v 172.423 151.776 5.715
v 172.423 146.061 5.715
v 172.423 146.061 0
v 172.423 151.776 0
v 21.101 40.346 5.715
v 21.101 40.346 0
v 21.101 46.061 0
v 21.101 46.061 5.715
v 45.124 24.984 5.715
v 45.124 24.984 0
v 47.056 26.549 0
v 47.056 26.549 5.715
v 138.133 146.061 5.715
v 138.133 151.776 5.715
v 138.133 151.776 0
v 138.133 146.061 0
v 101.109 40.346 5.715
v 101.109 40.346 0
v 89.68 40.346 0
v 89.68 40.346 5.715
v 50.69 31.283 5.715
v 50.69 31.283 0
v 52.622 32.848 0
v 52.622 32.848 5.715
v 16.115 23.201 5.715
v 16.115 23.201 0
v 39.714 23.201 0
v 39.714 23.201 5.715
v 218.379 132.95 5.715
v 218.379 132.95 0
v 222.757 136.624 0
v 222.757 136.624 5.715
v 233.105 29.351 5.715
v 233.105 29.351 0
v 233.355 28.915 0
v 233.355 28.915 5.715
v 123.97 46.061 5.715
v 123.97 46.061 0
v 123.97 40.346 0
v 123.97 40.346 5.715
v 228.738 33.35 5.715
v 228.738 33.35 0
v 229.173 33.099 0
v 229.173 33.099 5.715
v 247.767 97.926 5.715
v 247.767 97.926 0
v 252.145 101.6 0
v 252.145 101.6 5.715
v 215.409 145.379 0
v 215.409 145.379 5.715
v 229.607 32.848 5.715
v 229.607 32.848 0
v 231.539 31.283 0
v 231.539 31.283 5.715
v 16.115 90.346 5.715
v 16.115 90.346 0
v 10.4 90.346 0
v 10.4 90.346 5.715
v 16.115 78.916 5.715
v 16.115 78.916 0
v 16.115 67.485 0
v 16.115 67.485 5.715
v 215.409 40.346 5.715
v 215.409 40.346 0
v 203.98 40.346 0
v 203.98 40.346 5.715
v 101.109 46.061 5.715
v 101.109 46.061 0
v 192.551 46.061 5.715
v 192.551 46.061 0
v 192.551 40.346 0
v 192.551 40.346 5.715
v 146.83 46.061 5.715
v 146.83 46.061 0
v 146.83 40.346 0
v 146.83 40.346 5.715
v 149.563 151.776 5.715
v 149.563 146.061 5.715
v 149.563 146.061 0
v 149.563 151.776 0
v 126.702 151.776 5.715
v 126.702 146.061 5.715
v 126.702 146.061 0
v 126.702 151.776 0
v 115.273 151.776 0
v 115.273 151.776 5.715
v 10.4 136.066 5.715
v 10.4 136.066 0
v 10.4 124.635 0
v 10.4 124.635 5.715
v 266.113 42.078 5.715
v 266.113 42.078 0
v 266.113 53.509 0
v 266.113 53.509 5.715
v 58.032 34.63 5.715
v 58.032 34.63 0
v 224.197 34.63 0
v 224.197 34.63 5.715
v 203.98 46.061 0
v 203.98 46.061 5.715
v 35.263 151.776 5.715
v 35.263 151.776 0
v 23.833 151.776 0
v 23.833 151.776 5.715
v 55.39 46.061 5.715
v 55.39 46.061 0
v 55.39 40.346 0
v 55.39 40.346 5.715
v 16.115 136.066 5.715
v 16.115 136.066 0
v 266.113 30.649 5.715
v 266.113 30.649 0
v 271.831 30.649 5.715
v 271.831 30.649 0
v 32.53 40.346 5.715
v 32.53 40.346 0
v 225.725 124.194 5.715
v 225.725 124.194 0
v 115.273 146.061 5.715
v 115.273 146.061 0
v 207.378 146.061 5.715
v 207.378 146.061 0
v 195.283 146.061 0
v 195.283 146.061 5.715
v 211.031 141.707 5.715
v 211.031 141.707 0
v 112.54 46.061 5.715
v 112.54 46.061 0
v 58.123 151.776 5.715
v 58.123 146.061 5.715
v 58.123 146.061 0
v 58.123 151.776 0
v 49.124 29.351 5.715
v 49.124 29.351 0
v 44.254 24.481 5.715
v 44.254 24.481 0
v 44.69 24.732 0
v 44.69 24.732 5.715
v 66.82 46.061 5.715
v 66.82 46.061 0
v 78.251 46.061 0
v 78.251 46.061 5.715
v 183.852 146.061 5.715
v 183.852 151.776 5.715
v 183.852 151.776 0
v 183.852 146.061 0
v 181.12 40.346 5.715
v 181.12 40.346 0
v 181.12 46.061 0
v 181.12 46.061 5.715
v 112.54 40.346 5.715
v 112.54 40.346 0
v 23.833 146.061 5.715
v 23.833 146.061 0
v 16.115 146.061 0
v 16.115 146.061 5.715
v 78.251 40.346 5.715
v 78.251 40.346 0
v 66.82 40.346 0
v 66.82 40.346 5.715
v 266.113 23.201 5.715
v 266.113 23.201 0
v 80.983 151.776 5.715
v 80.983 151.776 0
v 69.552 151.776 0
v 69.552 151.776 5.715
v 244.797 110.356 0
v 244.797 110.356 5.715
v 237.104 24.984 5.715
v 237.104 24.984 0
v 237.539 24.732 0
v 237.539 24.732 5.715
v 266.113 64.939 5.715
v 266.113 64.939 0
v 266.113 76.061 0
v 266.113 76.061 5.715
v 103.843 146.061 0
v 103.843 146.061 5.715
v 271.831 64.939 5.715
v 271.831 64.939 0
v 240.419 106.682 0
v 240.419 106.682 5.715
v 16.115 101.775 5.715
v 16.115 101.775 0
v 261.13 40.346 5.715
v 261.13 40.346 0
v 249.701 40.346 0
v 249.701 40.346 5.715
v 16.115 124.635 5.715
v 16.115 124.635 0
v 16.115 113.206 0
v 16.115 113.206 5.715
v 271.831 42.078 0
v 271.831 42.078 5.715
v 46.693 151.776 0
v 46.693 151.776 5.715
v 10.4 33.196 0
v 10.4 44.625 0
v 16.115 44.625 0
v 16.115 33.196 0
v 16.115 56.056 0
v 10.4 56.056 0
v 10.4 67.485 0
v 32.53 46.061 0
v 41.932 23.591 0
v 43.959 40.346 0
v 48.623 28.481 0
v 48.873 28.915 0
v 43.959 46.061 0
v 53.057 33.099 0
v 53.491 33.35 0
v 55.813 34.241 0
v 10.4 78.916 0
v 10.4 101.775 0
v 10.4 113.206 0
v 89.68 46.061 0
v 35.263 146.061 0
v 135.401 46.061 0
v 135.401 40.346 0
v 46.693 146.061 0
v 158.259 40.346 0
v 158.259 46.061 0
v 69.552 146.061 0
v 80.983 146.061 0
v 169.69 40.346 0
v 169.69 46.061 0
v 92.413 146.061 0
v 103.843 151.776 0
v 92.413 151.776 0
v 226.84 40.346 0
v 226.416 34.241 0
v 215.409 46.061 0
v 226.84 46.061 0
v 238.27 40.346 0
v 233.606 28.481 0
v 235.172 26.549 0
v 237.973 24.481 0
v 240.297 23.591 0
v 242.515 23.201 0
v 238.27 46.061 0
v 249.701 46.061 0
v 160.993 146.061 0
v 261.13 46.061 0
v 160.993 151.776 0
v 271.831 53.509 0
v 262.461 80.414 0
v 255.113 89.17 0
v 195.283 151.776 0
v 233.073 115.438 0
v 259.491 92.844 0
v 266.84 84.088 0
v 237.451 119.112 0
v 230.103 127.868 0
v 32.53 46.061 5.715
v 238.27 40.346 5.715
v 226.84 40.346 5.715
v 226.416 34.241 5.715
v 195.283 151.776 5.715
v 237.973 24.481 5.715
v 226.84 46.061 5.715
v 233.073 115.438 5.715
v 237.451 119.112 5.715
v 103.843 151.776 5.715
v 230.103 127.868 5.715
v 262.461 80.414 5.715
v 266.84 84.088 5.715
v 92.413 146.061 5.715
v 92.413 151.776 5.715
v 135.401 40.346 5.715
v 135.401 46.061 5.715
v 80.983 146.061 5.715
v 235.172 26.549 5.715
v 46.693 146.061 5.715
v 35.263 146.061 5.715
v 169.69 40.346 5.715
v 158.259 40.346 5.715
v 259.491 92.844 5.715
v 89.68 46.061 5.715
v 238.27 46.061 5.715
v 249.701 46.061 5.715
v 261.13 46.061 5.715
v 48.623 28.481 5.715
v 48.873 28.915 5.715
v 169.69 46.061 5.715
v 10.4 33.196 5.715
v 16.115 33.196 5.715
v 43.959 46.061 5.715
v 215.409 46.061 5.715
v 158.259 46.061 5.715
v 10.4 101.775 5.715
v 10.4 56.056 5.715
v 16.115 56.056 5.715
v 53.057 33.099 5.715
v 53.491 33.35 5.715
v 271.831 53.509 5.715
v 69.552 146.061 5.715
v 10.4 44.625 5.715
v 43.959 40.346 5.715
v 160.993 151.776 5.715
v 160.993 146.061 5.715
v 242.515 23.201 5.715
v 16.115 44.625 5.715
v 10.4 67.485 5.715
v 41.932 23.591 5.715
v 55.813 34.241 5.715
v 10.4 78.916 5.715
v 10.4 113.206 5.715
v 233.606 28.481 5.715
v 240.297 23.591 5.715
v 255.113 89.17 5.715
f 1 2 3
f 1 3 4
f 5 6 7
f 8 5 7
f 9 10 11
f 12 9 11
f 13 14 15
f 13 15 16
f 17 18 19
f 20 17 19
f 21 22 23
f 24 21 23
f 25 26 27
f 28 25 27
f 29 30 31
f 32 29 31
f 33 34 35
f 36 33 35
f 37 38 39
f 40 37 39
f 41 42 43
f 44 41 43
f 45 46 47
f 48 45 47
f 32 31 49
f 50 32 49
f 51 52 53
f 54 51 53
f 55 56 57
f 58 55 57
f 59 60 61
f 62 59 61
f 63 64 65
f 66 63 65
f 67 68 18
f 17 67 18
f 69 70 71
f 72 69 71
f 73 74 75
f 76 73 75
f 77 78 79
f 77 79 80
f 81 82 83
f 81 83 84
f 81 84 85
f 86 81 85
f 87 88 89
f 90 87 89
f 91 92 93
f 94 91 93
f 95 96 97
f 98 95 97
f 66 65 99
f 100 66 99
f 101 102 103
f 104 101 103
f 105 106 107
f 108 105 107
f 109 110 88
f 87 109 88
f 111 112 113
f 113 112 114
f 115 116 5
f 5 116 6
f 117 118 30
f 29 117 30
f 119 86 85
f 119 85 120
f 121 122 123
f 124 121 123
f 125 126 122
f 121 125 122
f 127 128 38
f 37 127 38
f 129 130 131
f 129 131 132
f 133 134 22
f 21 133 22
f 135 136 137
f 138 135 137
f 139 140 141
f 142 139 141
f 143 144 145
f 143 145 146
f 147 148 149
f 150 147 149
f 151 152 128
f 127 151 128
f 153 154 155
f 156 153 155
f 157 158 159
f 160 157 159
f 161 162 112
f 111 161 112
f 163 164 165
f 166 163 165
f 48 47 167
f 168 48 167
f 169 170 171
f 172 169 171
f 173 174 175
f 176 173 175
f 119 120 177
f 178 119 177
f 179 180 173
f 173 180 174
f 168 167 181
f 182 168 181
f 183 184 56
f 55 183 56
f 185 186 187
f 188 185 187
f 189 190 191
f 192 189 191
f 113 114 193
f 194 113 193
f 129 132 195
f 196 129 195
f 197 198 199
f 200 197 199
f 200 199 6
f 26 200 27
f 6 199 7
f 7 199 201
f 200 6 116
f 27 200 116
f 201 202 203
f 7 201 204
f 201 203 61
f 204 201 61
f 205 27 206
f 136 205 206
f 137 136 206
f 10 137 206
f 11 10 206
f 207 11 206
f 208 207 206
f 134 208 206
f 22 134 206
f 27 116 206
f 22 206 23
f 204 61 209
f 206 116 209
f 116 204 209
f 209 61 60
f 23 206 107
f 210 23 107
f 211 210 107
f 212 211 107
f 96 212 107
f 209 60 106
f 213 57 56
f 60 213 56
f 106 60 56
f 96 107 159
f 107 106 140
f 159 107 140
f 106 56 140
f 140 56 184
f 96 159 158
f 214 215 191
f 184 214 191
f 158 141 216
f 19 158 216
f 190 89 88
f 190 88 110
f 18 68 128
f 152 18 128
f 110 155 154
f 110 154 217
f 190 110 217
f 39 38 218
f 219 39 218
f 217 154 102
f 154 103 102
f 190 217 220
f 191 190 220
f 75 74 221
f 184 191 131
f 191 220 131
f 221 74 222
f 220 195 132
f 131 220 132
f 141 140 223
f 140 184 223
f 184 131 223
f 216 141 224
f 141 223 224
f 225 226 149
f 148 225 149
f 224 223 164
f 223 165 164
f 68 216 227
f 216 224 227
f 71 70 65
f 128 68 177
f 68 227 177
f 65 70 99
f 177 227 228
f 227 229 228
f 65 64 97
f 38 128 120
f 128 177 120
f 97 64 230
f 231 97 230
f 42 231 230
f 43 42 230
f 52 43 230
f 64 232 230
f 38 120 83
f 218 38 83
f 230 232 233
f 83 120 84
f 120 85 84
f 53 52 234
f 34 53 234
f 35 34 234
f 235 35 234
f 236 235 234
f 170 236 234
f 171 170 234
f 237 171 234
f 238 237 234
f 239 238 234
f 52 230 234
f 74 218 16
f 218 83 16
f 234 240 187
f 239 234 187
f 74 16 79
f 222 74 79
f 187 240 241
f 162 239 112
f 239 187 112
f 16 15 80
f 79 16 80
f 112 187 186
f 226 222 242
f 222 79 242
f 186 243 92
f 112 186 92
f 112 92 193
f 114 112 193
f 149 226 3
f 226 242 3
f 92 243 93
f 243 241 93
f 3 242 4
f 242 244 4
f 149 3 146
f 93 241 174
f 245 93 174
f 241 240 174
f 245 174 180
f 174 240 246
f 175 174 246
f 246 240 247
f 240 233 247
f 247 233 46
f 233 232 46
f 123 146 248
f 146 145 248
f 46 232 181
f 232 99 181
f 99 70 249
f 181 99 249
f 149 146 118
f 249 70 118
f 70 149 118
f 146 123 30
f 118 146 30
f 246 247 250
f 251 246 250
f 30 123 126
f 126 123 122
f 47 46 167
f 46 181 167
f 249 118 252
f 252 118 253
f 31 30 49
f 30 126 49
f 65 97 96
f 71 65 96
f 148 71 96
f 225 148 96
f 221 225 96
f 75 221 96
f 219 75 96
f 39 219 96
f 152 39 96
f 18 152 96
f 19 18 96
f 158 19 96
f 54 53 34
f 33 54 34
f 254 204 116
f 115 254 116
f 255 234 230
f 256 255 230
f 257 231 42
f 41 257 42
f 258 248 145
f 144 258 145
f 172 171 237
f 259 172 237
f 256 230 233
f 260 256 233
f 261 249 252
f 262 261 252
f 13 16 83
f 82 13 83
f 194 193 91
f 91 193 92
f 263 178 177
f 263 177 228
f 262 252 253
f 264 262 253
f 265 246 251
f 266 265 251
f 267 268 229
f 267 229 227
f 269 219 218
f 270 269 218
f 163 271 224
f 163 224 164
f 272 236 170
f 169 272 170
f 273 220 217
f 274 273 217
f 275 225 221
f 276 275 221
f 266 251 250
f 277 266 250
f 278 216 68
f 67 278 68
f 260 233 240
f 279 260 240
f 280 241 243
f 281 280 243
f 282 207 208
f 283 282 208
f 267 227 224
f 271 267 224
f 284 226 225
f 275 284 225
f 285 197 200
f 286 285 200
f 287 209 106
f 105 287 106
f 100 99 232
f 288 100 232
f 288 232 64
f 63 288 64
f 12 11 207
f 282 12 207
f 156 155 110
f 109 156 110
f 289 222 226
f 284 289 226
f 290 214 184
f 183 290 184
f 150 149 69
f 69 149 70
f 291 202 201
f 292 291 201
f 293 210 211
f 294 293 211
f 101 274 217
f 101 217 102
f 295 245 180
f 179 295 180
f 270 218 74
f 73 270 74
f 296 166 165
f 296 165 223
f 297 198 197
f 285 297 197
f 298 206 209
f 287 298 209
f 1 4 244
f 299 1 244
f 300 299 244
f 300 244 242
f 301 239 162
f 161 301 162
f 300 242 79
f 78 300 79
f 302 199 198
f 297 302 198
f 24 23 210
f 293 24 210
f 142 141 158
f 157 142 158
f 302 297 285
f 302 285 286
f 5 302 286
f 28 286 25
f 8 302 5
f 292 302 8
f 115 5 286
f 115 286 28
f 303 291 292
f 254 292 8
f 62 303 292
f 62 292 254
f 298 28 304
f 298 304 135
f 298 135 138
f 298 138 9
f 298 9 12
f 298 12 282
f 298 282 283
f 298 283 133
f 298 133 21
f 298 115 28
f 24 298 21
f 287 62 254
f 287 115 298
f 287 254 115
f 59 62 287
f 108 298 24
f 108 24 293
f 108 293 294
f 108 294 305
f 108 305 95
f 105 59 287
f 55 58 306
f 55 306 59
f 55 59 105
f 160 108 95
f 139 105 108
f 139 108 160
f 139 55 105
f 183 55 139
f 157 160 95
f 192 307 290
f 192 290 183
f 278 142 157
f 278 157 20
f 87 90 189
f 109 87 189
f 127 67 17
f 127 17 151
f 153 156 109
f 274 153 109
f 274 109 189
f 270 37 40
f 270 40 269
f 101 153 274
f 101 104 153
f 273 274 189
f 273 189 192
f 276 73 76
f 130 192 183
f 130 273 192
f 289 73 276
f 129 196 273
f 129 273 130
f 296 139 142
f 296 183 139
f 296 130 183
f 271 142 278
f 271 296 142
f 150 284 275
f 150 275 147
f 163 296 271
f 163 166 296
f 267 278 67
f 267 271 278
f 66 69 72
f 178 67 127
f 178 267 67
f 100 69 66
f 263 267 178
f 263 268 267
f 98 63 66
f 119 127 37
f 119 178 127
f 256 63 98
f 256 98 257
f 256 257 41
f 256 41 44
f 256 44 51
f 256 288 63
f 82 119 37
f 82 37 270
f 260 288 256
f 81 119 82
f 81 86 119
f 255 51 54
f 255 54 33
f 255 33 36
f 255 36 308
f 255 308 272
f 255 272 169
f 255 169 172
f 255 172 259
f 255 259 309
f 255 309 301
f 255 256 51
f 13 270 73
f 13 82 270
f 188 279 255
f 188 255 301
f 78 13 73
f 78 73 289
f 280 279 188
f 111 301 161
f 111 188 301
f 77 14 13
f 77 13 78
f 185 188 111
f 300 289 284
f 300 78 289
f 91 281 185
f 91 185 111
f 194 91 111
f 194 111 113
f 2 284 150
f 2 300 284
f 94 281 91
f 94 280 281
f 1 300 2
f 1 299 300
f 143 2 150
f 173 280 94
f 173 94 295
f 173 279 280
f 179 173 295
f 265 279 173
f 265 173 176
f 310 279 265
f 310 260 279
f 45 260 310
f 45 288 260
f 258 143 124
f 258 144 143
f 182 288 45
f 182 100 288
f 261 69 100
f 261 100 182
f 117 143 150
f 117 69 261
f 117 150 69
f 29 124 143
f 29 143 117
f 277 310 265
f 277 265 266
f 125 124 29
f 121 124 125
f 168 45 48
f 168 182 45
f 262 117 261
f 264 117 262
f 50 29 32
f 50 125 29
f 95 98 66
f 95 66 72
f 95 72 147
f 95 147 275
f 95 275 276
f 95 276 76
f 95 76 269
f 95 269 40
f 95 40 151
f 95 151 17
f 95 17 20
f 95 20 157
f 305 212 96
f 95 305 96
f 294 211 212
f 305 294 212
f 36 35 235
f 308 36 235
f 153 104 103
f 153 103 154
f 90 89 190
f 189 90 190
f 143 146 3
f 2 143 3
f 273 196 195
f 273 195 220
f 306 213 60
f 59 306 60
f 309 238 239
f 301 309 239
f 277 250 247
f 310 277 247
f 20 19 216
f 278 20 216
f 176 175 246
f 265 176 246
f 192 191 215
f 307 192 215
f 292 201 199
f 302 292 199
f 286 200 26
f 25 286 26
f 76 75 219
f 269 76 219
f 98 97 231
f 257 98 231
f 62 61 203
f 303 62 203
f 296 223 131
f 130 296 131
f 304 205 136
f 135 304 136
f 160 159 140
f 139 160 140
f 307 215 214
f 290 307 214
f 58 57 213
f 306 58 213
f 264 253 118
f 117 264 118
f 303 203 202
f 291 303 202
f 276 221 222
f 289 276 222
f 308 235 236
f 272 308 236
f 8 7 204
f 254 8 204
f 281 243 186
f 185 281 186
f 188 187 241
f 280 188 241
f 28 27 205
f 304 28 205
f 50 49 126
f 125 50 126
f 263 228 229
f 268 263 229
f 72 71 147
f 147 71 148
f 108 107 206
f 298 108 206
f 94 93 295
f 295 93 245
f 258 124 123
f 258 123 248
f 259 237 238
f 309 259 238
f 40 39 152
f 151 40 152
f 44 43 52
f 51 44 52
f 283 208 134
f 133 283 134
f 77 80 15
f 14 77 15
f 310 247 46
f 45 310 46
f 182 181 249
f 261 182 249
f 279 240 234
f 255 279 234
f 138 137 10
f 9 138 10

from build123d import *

# Parameters (mm, degrees)
BOSS_EXTRUDE1_DEPTH = 5.715


with BuildPart() as part:
    # Model → Boss-Extrude1 (new body)
    with BuildSketch(Plane.XY):
        Polygon((16.114776, 23.2006394), (38.974776, 23.2006394), (39.713662, 23.2006394), (41.932098, 23.590631), (44.254166, 24.4808502), (44.689776, 24.7316498), (45.123862, 24.983821), (47.05604, 26.54935), (48.622712, 28.481274), (48.87341, 28.91536), (49.124362, 29.350716), (50.690018, 31.282894), (52.621688, 32.848296), (53.057044, 33.098994), (53.491384, 33.349946), (55.813198, 34.241486), (58.031888, 34.630106), (58.772044, 34.630106), (223.458532, 34.630106), (224.197418, 34.630106), (226.415854, 34.241486), (228.737922, 33.349946), (229.173278, 33.098994), (229.60711, 32.848296), (231.539288, 31.282894), (233.104944, 29.350716), (233.355388, 28.91536), (233.60634, 28.481274), (235.171996, 26.54935), (237.103666, 24.983821), (237.539276, 24.7316498), (237.973362, 24.4808502), (240.2967, 23.590631), (242.51539, 23.2006394), (243.255546, 23.2006394), (266.11326, 23.2006394), (266.11326, 30.64891), (271.8308, 30.64891), (271.8308, 42.078402), (266.11326, 42.078402), (266.11326, 53.509418), (271.8308, 53.509418), (271.8308, 64.938656), (266.11326, 64.938656), (266.11326, 76.060554), (262.46074, 80.41386), (266.8397, 84.087716), (259.49148, 92.844112), (255.11252, 89.170256), (247.767094, 97.926144), (252.145038, 101.6), (244.797326, 110.355888), (240.419382, 106.682032), (233.073194, 115.438428), (237.451138, 119.112284), (230.103426, 127.868172), (225.725482, 124.194316), (218.37904, 132.950204), (222.757238, 136.62406), (215.409272, 145.378932), (211.031328, 141.7066), (207.3783, 146.060922), (195.283328, 146.060922), (195.283328, 151.775668), (183.852312, 151.775668), (183.852312, 146.060922), (172.423074, 146.060922), (172.423074, 151.775668), (160.993328, 151.775668), (160.993328, 146.060922), (149.562566, 146.060922), (149.562566, 151.775668), (138.133328, 151.775668), (138.133328, 146.060922), (126.702312, 146.060922), (126.702312, 151.775668), (115.273074, 151.775668), (115.273074, 146.060922), (103.843328, 146.060922), (103.843328, 151.775668), (92.412566, 151.775668), (92.412566, 146.060922), (80.983328, 146.060922), (80.983328, 151.775668), (69.552312, 151.775668), (69.552312, 146.060922), (58.123074, 146.060922), (58.123074, 151.775668), (46.693328, 151.775668), (46.693328, 146.060922), (35.262566, 146.060922), (35.262566, 151.775668), (23.8331756, 151.775668), (23.8331756, 146.060922), (16.114776, 146.060922), (16.114776, 136.066022), (10.4000554, 136.066022), (10.4000554, 124.63526), (16.114776, 124.63526), (16.114776, 113.205768), (10.4000554, 113.205768), (10.4000554, 101.775006), (16.114776, 101.775006), (16.114776, 90.345768), (10.4000554, 90.345768), (10.4000554, 78.916022), (16.114776, 78.916022), (16.114776, 67.48526), (10.4000554, 67.48526), (10.4000554, 56.055768), (16.114776, 56.055768), (16.114776, 44.625006), (10.4000554, 44.625006), (10.4000554, 33.195514), (16.114776, 33.195514), align=None)
        Polygon((26.815288, 40.346122), (21.1005166, 40.346122), (21.1005166, 46.060868), (32.530034, 46.060868), (32.530034, 40.346122), align=None, mode=Mode.SUBTRACT)
        Polygon((49.675796, 40.346122), (43.959272, 40.346122), (43.959272, 46.060868), (55.390288, 46.060868), (55.390288, 40.346122), align=None, mode=Mode.SUBTRACT)
        Polygon((72.534272, 40.346122), (66.819526, 40.346122), (66.819526, 46.060868), (78.250796, 46.060868), (78.250796, 40.346122), align=None, mode=Mode.SUBTRACT)
        Polygon((95.394526, 40.346122), (89.680034, 40.346122), (89.680034, 46.060868), (101.109272, 46.060868), (101.109272, 40.346122), align=None, mode=Mode.SUBTRACT)
        Polygon((118.255034, 40.346122), (112.540288, 40.346122), (112.540288, 46.060868), (123.969526, 46.060868), (123.969526, 40.346122), align=None, mode=Mode.SUBTRACT)
        Polygon((141.115288, 40.346122), (135.400796, 40.346122), (135.400796, 46.060868), (146.830034, 46.060868), (146.830034, 40.346122), align=None, mode=Mode.SUBTRACT)
        Polygon((163.975796, 40.346122), (158.259272, 40.346122), (158.259272, 46.060868), (169.690288, 46.060868), (169.690288, 40.346122), align=None, mode=Mode.SUBTRACT)
        Polygon((186.834272, 40.346122), (181.119526, 40.346122), (181.119526, 46.060868), (192.550796, 46.060868), (192.550796, 40.346122), align=None, mode=Mode.SUBTRACT)
        Polygon((209.694526, 40.346122), (203.980034, 40.346122), (203.980034, 46.060868), (215.409272, 46.060868), (215.409272, 40.346122), align=None, mode=Mode.SUBTRACT)
        Polygon((232.555034, 40.346122), (226.840288, 40.346122), (226.840288, 46.060868), (238.269526, 46.060868), (238.269526, 40.346122), align=None, mode=Mode.SUBTRACT)
        Polygon((255.41478, 40.346122), (249.700796, 40.346122), (249.700796, 46.060868), (261.12978, 46.060868), (261.12978, 40.346122), align=None, mode=Mode.SUBTRACT)
    extrude(amount=BOSS_EXTRUDE1_DEPTH)


solid = part.part
